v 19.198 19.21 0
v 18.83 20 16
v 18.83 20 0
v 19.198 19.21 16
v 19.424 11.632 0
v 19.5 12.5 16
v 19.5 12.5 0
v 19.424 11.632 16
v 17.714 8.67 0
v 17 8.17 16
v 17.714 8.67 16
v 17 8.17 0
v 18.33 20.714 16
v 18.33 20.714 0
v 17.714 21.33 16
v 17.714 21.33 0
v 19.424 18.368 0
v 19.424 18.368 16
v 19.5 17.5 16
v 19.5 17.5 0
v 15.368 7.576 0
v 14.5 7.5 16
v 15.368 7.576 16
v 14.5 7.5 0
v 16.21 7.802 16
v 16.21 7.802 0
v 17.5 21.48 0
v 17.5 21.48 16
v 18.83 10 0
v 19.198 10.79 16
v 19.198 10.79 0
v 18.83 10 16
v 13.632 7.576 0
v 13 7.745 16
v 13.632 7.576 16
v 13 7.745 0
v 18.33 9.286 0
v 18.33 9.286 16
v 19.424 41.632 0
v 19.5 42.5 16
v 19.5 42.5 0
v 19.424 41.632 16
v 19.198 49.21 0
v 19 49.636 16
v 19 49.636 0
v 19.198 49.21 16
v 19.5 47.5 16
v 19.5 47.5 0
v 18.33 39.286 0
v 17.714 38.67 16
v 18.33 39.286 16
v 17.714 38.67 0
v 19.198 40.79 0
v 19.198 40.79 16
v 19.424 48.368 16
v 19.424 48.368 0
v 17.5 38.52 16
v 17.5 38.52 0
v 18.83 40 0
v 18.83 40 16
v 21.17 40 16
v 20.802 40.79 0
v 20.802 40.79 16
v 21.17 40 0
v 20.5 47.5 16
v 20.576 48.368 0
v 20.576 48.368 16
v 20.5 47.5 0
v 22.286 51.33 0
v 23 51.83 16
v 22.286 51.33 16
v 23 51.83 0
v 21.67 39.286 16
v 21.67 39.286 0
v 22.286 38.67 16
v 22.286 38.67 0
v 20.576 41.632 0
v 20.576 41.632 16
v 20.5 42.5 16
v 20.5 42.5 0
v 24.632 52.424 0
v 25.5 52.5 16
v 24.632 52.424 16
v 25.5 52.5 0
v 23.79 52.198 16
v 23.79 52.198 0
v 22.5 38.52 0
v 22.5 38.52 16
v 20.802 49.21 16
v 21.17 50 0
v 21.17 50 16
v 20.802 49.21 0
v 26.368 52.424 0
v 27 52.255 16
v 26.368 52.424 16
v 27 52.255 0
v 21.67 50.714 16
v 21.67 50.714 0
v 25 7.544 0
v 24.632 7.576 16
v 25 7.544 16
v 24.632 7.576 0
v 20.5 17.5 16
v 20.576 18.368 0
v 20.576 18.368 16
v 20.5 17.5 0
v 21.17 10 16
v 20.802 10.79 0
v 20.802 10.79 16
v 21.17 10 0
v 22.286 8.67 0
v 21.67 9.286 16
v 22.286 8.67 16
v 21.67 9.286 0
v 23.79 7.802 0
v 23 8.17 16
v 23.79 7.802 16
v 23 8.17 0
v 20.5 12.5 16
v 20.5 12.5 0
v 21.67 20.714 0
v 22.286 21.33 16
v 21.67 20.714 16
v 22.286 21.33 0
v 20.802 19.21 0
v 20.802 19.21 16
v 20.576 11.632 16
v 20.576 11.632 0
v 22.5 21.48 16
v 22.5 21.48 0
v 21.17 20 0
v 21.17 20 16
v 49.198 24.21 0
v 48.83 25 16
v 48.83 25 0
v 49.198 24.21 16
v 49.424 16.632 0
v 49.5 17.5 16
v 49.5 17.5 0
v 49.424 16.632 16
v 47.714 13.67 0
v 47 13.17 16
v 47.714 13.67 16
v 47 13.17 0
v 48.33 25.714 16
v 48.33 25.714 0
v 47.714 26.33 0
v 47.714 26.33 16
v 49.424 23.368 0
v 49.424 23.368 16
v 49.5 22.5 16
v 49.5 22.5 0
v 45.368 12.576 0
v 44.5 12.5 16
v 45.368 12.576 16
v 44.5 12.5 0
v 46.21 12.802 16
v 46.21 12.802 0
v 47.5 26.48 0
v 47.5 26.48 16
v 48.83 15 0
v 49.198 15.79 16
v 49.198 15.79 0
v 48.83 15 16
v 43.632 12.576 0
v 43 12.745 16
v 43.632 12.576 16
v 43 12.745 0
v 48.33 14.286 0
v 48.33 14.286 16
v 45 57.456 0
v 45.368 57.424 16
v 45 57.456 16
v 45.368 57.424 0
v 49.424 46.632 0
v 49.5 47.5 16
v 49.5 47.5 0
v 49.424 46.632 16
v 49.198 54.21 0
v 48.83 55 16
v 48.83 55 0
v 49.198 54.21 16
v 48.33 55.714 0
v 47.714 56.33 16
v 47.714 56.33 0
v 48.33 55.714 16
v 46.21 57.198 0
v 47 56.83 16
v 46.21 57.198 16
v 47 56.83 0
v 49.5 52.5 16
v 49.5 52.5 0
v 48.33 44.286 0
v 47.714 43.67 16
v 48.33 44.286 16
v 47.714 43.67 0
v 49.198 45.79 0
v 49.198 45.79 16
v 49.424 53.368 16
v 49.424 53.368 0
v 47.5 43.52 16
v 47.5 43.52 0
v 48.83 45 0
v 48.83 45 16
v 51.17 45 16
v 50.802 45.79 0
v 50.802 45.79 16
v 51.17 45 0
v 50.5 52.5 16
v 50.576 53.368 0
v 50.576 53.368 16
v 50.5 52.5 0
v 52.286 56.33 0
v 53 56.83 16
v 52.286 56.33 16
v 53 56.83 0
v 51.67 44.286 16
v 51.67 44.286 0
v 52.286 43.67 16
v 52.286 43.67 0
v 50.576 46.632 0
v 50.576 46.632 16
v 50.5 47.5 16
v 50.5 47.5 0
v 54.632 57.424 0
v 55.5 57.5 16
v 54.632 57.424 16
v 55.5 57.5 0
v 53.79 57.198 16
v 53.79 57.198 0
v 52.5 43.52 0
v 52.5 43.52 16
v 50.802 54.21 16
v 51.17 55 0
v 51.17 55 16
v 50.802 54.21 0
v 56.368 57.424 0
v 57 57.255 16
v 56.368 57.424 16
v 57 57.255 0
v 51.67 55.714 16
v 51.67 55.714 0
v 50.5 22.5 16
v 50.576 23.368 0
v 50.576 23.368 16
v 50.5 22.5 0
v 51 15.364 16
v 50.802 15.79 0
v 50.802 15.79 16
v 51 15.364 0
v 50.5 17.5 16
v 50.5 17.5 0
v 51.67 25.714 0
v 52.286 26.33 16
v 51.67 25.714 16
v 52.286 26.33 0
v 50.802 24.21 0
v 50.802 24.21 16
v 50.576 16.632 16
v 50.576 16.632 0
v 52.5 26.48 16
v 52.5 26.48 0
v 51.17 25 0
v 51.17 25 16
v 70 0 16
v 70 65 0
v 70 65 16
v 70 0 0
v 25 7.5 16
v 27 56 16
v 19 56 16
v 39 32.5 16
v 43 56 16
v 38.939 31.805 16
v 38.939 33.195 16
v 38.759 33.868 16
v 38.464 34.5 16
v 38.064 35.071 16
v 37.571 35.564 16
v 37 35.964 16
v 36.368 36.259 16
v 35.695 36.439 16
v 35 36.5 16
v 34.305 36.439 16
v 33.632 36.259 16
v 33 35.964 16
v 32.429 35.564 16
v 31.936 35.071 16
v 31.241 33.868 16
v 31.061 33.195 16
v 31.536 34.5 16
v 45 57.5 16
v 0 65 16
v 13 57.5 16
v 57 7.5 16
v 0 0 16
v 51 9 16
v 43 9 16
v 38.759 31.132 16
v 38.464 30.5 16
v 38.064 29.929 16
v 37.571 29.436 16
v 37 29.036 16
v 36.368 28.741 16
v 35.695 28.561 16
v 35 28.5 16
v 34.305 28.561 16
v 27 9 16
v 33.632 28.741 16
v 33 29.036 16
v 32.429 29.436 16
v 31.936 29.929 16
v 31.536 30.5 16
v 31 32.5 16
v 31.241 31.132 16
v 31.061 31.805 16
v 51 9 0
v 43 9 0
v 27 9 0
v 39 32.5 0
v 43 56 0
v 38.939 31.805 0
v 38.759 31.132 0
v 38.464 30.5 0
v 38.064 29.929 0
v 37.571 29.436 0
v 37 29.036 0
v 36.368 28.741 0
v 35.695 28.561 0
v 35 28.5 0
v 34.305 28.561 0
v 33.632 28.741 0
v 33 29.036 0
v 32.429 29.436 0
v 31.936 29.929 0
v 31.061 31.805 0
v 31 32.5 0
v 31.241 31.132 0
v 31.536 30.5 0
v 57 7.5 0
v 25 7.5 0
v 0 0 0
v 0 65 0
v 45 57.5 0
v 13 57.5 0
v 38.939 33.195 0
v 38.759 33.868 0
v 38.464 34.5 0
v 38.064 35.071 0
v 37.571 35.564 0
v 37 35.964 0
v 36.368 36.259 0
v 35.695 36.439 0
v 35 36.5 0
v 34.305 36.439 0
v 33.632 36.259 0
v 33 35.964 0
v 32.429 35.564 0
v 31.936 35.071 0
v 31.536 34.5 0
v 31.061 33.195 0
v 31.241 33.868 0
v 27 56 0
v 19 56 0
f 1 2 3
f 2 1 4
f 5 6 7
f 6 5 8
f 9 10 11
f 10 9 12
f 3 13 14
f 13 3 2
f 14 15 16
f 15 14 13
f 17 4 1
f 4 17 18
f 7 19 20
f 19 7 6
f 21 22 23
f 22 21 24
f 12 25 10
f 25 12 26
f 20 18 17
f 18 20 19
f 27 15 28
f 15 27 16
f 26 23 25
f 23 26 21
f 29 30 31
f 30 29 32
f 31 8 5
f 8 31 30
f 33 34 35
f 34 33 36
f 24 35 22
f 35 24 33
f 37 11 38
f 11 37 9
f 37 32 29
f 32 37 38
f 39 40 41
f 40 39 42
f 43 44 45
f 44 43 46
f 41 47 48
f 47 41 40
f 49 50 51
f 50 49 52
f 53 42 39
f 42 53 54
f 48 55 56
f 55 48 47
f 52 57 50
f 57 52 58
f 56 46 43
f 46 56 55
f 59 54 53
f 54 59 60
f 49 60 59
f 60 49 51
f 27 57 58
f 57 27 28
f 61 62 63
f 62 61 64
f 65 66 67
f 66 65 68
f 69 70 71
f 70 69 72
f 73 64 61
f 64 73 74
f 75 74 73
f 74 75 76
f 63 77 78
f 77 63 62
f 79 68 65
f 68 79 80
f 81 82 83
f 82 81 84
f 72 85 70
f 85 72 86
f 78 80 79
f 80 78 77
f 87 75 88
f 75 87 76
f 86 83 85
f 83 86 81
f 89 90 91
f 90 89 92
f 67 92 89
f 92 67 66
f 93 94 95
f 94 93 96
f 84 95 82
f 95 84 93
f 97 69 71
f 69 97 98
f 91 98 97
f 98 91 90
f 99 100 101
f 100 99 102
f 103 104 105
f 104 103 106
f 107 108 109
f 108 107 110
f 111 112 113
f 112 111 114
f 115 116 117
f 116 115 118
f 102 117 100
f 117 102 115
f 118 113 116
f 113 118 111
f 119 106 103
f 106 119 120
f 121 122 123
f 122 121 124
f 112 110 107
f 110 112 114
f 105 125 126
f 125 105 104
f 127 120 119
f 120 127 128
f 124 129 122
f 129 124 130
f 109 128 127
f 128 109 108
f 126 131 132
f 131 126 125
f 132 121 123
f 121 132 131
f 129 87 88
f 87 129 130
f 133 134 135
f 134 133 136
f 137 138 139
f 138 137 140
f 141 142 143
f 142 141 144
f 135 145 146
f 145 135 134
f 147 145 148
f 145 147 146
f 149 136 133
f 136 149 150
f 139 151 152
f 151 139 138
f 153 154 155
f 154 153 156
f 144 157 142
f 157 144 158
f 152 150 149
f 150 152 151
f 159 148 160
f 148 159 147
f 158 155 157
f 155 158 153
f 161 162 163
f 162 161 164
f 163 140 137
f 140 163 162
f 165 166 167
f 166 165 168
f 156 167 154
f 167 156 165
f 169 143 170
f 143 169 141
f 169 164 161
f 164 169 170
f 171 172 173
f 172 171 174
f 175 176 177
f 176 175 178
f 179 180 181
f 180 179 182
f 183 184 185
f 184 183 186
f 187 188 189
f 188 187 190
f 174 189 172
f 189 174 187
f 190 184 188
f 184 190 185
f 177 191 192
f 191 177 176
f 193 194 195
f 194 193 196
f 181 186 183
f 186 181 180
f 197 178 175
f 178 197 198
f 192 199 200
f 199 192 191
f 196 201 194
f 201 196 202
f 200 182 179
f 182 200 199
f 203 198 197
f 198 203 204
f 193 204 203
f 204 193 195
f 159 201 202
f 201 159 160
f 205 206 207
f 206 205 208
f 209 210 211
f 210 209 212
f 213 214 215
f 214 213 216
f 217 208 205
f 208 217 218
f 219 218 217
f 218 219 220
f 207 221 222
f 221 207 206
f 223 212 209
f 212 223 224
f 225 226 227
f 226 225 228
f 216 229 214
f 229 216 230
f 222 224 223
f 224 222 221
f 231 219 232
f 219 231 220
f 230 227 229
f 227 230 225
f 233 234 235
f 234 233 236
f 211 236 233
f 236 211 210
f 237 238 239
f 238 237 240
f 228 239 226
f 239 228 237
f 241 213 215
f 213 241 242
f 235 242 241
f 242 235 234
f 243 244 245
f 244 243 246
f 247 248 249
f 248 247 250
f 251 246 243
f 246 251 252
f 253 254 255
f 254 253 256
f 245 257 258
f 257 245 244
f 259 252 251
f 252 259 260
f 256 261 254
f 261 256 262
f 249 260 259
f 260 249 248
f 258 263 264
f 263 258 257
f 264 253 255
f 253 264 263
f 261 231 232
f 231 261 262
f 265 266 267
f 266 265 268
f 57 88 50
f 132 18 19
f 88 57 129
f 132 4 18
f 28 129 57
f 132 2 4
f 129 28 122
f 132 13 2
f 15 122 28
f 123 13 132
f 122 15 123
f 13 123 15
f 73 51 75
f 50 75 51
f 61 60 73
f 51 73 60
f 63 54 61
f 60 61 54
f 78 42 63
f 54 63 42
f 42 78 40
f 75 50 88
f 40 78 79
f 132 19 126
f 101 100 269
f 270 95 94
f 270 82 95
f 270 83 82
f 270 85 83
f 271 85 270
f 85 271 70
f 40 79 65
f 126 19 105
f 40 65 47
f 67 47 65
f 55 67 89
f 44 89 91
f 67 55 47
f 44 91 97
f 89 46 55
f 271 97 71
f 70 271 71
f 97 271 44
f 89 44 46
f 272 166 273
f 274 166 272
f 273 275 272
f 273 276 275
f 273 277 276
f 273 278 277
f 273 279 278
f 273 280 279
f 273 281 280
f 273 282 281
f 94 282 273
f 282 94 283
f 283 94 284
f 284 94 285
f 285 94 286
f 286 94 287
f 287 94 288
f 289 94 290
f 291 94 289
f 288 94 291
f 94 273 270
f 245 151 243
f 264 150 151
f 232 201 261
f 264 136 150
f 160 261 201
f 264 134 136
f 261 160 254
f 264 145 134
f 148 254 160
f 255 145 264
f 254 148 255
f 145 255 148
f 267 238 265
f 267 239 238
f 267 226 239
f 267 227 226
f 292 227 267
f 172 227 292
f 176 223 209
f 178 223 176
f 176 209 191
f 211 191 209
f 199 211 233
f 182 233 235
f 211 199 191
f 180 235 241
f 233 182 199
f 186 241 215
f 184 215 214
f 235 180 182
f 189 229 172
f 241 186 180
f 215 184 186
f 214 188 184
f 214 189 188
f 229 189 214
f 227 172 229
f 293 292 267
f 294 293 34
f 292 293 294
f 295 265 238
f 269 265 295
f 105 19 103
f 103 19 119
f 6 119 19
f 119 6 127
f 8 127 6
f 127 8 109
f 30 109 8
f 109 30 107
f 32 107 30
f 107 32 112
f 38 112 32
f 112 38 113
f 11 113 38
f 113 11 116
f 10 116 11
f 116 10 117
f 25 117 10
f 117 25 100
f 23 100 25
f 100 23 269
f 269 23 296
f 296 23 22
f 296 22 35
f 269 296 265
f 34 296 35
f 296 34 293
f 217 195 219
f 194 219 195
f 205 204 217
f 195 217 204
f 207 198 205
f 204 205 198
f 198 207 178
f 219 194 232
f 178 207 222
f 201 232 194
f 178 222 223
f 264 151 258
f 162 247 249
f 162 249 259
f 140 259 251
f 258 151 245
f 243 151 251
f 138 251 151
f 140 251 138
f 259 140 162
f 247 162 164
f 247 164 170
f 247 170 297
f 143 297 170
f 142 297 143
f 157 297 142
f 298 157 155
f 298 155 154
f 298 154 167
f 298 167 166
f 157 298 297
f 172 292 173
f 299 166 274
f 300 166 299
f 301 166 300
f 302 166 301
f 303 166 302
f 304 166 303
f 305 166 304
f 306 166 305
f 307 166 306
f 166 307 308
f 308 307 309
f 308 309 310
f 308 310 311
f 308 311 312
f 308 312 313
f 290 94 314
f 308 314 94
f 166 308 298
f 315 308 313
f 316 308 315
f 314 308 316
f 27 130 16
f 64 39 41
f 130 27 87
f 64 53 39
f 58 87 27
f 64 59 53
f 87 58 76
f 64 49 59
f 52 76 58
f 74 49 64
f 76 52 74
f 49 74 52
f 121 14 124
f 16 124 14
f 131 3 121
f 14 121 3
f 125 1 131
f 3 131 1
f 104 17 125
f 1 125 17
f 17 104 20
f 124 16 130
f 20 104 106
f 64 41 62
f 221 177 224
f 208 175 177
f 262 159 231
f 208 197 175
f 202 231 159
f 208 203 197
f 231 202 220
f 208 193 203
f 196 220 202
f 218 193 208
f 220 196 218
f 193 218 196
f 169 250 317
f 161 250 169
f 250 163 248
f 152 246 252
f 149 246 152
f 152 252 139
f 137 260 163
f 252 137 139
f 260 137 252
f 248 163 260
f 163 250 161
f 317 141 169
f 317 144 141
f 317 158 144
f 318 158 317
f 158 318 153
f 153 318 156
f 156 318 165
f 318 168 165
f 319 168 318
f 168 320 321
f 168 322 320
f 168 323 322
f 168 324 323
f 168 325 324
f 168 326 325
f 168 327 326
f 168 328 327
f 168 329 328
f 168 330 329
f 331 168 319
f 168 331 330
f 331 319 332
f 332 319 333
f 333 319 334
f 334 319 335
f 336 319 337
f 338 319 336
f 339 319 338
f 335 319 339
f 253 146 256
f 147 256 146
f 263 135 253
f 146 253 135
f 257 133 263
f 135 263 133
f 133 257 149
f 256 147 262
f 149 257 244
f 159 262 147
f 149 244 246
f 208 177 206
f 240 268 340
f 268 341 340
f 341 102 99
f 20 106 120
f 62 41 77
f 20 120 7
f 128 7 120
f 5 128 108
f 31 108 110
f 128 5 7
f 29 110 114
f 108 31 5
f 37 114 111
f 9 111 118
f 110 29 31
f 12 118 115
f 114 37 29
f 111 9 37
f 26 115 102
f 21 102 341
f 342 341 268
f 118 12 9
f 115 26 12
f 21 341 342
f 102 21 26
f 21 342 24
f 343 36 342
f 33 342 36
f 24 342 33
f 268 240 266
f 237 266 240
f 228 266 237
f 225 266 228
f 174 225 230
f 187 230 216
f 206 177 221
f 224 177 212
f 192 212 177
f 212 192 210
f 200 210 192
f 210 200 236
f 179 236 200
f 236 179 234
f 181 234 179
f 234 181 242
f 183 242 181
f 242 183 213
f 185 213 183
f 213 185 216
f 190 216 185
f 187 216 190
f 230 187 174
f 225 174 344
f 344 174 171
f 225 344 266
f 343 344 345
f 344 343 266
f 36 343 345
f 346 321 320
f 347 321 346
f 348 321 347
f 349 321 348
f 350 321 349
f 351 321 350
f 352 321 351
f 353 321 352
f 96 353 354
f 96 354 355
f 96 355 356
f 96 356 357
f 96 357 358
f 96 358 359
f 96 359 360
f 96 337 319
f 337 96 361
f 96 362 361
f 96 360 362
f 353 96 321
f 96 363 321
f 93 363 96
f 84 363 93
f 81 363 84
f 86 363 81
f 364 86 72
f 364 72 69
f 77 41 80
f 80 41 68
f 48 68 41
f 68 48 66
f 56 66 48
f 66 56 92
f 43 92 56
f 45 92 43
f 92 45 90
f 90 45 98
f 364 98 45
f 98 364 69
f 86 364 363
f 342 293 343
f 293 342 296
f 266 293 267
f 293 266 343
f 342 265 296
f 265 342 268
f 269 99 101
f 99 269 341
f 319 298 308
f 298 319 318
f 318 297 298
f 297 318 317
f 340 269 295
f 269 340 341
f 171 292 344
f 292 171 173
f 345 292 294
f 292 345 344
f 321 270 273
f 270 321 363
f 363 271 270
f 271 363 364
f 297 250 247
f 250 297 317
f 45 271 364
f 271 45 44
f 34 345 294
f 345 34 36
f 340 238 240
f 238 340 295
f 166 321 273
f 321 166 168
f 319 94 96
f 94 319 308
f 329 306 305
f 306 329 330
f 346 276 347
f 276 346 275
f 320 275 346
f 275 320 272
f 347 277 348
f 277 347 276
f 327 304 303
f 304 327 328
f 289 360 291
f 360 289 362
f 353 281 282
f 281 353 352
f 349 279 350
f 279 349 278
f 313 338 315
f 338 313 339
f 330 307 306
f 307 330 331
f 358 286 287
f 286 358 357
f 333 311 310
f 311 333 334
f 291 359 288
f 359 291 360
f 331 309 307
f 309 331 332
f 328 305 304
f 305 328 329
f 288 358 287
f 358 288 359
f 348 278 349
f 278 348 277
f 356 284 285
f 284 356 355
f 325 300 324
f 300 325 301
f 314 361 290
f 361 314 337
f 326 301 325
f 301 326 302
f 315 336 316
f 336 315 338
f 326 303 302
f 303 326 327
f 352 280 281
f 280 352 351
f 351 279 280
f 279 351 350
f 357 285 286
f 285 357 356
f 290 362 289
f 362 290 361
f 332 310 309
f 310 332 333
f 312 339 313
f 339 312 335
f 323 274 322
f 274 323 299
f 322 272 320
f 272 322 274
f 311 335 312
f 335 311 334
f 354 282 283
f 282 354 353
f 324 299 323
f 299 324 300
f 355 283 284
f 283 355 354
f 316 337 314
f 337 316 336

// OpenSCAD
module M1()
hull(){
cylinder(r=5,h=20,$fn=36);
translate([0,5,0])cylinder(r=5,h=20,$fn=36);}

module M2(){
M1();translate([0,30,0])M1();translate([-5,5,0])cube([8,25,21]);
}
module M3(){
translate([-5.5,-17.50,-1])M2();
translate([5.5,17.5,-1])rotate(180)M2();}
difference(){
union(){
difference(){
cube([70,65,16]);
 translate([20,30,0])M3();
translate([50,35,0])M3();
translate([25,7.5,-1])cube([35,1.5,21]);
translate([10,56,-1])cube([35,1.5,21]);
translate([51,7.5,-1])cube([7,10,21]);
translate([12,47.5,-1])cube([7,10,21]);}
translate([0,0,0])cube([13,65,16]);
translate([57,0,0])cube([13,65,16]);
translate([27,9,0])cube([16,47,16]);
}
translate([35,32.5,-1])cylinder(r=4,h=21,$fn=36);
}
